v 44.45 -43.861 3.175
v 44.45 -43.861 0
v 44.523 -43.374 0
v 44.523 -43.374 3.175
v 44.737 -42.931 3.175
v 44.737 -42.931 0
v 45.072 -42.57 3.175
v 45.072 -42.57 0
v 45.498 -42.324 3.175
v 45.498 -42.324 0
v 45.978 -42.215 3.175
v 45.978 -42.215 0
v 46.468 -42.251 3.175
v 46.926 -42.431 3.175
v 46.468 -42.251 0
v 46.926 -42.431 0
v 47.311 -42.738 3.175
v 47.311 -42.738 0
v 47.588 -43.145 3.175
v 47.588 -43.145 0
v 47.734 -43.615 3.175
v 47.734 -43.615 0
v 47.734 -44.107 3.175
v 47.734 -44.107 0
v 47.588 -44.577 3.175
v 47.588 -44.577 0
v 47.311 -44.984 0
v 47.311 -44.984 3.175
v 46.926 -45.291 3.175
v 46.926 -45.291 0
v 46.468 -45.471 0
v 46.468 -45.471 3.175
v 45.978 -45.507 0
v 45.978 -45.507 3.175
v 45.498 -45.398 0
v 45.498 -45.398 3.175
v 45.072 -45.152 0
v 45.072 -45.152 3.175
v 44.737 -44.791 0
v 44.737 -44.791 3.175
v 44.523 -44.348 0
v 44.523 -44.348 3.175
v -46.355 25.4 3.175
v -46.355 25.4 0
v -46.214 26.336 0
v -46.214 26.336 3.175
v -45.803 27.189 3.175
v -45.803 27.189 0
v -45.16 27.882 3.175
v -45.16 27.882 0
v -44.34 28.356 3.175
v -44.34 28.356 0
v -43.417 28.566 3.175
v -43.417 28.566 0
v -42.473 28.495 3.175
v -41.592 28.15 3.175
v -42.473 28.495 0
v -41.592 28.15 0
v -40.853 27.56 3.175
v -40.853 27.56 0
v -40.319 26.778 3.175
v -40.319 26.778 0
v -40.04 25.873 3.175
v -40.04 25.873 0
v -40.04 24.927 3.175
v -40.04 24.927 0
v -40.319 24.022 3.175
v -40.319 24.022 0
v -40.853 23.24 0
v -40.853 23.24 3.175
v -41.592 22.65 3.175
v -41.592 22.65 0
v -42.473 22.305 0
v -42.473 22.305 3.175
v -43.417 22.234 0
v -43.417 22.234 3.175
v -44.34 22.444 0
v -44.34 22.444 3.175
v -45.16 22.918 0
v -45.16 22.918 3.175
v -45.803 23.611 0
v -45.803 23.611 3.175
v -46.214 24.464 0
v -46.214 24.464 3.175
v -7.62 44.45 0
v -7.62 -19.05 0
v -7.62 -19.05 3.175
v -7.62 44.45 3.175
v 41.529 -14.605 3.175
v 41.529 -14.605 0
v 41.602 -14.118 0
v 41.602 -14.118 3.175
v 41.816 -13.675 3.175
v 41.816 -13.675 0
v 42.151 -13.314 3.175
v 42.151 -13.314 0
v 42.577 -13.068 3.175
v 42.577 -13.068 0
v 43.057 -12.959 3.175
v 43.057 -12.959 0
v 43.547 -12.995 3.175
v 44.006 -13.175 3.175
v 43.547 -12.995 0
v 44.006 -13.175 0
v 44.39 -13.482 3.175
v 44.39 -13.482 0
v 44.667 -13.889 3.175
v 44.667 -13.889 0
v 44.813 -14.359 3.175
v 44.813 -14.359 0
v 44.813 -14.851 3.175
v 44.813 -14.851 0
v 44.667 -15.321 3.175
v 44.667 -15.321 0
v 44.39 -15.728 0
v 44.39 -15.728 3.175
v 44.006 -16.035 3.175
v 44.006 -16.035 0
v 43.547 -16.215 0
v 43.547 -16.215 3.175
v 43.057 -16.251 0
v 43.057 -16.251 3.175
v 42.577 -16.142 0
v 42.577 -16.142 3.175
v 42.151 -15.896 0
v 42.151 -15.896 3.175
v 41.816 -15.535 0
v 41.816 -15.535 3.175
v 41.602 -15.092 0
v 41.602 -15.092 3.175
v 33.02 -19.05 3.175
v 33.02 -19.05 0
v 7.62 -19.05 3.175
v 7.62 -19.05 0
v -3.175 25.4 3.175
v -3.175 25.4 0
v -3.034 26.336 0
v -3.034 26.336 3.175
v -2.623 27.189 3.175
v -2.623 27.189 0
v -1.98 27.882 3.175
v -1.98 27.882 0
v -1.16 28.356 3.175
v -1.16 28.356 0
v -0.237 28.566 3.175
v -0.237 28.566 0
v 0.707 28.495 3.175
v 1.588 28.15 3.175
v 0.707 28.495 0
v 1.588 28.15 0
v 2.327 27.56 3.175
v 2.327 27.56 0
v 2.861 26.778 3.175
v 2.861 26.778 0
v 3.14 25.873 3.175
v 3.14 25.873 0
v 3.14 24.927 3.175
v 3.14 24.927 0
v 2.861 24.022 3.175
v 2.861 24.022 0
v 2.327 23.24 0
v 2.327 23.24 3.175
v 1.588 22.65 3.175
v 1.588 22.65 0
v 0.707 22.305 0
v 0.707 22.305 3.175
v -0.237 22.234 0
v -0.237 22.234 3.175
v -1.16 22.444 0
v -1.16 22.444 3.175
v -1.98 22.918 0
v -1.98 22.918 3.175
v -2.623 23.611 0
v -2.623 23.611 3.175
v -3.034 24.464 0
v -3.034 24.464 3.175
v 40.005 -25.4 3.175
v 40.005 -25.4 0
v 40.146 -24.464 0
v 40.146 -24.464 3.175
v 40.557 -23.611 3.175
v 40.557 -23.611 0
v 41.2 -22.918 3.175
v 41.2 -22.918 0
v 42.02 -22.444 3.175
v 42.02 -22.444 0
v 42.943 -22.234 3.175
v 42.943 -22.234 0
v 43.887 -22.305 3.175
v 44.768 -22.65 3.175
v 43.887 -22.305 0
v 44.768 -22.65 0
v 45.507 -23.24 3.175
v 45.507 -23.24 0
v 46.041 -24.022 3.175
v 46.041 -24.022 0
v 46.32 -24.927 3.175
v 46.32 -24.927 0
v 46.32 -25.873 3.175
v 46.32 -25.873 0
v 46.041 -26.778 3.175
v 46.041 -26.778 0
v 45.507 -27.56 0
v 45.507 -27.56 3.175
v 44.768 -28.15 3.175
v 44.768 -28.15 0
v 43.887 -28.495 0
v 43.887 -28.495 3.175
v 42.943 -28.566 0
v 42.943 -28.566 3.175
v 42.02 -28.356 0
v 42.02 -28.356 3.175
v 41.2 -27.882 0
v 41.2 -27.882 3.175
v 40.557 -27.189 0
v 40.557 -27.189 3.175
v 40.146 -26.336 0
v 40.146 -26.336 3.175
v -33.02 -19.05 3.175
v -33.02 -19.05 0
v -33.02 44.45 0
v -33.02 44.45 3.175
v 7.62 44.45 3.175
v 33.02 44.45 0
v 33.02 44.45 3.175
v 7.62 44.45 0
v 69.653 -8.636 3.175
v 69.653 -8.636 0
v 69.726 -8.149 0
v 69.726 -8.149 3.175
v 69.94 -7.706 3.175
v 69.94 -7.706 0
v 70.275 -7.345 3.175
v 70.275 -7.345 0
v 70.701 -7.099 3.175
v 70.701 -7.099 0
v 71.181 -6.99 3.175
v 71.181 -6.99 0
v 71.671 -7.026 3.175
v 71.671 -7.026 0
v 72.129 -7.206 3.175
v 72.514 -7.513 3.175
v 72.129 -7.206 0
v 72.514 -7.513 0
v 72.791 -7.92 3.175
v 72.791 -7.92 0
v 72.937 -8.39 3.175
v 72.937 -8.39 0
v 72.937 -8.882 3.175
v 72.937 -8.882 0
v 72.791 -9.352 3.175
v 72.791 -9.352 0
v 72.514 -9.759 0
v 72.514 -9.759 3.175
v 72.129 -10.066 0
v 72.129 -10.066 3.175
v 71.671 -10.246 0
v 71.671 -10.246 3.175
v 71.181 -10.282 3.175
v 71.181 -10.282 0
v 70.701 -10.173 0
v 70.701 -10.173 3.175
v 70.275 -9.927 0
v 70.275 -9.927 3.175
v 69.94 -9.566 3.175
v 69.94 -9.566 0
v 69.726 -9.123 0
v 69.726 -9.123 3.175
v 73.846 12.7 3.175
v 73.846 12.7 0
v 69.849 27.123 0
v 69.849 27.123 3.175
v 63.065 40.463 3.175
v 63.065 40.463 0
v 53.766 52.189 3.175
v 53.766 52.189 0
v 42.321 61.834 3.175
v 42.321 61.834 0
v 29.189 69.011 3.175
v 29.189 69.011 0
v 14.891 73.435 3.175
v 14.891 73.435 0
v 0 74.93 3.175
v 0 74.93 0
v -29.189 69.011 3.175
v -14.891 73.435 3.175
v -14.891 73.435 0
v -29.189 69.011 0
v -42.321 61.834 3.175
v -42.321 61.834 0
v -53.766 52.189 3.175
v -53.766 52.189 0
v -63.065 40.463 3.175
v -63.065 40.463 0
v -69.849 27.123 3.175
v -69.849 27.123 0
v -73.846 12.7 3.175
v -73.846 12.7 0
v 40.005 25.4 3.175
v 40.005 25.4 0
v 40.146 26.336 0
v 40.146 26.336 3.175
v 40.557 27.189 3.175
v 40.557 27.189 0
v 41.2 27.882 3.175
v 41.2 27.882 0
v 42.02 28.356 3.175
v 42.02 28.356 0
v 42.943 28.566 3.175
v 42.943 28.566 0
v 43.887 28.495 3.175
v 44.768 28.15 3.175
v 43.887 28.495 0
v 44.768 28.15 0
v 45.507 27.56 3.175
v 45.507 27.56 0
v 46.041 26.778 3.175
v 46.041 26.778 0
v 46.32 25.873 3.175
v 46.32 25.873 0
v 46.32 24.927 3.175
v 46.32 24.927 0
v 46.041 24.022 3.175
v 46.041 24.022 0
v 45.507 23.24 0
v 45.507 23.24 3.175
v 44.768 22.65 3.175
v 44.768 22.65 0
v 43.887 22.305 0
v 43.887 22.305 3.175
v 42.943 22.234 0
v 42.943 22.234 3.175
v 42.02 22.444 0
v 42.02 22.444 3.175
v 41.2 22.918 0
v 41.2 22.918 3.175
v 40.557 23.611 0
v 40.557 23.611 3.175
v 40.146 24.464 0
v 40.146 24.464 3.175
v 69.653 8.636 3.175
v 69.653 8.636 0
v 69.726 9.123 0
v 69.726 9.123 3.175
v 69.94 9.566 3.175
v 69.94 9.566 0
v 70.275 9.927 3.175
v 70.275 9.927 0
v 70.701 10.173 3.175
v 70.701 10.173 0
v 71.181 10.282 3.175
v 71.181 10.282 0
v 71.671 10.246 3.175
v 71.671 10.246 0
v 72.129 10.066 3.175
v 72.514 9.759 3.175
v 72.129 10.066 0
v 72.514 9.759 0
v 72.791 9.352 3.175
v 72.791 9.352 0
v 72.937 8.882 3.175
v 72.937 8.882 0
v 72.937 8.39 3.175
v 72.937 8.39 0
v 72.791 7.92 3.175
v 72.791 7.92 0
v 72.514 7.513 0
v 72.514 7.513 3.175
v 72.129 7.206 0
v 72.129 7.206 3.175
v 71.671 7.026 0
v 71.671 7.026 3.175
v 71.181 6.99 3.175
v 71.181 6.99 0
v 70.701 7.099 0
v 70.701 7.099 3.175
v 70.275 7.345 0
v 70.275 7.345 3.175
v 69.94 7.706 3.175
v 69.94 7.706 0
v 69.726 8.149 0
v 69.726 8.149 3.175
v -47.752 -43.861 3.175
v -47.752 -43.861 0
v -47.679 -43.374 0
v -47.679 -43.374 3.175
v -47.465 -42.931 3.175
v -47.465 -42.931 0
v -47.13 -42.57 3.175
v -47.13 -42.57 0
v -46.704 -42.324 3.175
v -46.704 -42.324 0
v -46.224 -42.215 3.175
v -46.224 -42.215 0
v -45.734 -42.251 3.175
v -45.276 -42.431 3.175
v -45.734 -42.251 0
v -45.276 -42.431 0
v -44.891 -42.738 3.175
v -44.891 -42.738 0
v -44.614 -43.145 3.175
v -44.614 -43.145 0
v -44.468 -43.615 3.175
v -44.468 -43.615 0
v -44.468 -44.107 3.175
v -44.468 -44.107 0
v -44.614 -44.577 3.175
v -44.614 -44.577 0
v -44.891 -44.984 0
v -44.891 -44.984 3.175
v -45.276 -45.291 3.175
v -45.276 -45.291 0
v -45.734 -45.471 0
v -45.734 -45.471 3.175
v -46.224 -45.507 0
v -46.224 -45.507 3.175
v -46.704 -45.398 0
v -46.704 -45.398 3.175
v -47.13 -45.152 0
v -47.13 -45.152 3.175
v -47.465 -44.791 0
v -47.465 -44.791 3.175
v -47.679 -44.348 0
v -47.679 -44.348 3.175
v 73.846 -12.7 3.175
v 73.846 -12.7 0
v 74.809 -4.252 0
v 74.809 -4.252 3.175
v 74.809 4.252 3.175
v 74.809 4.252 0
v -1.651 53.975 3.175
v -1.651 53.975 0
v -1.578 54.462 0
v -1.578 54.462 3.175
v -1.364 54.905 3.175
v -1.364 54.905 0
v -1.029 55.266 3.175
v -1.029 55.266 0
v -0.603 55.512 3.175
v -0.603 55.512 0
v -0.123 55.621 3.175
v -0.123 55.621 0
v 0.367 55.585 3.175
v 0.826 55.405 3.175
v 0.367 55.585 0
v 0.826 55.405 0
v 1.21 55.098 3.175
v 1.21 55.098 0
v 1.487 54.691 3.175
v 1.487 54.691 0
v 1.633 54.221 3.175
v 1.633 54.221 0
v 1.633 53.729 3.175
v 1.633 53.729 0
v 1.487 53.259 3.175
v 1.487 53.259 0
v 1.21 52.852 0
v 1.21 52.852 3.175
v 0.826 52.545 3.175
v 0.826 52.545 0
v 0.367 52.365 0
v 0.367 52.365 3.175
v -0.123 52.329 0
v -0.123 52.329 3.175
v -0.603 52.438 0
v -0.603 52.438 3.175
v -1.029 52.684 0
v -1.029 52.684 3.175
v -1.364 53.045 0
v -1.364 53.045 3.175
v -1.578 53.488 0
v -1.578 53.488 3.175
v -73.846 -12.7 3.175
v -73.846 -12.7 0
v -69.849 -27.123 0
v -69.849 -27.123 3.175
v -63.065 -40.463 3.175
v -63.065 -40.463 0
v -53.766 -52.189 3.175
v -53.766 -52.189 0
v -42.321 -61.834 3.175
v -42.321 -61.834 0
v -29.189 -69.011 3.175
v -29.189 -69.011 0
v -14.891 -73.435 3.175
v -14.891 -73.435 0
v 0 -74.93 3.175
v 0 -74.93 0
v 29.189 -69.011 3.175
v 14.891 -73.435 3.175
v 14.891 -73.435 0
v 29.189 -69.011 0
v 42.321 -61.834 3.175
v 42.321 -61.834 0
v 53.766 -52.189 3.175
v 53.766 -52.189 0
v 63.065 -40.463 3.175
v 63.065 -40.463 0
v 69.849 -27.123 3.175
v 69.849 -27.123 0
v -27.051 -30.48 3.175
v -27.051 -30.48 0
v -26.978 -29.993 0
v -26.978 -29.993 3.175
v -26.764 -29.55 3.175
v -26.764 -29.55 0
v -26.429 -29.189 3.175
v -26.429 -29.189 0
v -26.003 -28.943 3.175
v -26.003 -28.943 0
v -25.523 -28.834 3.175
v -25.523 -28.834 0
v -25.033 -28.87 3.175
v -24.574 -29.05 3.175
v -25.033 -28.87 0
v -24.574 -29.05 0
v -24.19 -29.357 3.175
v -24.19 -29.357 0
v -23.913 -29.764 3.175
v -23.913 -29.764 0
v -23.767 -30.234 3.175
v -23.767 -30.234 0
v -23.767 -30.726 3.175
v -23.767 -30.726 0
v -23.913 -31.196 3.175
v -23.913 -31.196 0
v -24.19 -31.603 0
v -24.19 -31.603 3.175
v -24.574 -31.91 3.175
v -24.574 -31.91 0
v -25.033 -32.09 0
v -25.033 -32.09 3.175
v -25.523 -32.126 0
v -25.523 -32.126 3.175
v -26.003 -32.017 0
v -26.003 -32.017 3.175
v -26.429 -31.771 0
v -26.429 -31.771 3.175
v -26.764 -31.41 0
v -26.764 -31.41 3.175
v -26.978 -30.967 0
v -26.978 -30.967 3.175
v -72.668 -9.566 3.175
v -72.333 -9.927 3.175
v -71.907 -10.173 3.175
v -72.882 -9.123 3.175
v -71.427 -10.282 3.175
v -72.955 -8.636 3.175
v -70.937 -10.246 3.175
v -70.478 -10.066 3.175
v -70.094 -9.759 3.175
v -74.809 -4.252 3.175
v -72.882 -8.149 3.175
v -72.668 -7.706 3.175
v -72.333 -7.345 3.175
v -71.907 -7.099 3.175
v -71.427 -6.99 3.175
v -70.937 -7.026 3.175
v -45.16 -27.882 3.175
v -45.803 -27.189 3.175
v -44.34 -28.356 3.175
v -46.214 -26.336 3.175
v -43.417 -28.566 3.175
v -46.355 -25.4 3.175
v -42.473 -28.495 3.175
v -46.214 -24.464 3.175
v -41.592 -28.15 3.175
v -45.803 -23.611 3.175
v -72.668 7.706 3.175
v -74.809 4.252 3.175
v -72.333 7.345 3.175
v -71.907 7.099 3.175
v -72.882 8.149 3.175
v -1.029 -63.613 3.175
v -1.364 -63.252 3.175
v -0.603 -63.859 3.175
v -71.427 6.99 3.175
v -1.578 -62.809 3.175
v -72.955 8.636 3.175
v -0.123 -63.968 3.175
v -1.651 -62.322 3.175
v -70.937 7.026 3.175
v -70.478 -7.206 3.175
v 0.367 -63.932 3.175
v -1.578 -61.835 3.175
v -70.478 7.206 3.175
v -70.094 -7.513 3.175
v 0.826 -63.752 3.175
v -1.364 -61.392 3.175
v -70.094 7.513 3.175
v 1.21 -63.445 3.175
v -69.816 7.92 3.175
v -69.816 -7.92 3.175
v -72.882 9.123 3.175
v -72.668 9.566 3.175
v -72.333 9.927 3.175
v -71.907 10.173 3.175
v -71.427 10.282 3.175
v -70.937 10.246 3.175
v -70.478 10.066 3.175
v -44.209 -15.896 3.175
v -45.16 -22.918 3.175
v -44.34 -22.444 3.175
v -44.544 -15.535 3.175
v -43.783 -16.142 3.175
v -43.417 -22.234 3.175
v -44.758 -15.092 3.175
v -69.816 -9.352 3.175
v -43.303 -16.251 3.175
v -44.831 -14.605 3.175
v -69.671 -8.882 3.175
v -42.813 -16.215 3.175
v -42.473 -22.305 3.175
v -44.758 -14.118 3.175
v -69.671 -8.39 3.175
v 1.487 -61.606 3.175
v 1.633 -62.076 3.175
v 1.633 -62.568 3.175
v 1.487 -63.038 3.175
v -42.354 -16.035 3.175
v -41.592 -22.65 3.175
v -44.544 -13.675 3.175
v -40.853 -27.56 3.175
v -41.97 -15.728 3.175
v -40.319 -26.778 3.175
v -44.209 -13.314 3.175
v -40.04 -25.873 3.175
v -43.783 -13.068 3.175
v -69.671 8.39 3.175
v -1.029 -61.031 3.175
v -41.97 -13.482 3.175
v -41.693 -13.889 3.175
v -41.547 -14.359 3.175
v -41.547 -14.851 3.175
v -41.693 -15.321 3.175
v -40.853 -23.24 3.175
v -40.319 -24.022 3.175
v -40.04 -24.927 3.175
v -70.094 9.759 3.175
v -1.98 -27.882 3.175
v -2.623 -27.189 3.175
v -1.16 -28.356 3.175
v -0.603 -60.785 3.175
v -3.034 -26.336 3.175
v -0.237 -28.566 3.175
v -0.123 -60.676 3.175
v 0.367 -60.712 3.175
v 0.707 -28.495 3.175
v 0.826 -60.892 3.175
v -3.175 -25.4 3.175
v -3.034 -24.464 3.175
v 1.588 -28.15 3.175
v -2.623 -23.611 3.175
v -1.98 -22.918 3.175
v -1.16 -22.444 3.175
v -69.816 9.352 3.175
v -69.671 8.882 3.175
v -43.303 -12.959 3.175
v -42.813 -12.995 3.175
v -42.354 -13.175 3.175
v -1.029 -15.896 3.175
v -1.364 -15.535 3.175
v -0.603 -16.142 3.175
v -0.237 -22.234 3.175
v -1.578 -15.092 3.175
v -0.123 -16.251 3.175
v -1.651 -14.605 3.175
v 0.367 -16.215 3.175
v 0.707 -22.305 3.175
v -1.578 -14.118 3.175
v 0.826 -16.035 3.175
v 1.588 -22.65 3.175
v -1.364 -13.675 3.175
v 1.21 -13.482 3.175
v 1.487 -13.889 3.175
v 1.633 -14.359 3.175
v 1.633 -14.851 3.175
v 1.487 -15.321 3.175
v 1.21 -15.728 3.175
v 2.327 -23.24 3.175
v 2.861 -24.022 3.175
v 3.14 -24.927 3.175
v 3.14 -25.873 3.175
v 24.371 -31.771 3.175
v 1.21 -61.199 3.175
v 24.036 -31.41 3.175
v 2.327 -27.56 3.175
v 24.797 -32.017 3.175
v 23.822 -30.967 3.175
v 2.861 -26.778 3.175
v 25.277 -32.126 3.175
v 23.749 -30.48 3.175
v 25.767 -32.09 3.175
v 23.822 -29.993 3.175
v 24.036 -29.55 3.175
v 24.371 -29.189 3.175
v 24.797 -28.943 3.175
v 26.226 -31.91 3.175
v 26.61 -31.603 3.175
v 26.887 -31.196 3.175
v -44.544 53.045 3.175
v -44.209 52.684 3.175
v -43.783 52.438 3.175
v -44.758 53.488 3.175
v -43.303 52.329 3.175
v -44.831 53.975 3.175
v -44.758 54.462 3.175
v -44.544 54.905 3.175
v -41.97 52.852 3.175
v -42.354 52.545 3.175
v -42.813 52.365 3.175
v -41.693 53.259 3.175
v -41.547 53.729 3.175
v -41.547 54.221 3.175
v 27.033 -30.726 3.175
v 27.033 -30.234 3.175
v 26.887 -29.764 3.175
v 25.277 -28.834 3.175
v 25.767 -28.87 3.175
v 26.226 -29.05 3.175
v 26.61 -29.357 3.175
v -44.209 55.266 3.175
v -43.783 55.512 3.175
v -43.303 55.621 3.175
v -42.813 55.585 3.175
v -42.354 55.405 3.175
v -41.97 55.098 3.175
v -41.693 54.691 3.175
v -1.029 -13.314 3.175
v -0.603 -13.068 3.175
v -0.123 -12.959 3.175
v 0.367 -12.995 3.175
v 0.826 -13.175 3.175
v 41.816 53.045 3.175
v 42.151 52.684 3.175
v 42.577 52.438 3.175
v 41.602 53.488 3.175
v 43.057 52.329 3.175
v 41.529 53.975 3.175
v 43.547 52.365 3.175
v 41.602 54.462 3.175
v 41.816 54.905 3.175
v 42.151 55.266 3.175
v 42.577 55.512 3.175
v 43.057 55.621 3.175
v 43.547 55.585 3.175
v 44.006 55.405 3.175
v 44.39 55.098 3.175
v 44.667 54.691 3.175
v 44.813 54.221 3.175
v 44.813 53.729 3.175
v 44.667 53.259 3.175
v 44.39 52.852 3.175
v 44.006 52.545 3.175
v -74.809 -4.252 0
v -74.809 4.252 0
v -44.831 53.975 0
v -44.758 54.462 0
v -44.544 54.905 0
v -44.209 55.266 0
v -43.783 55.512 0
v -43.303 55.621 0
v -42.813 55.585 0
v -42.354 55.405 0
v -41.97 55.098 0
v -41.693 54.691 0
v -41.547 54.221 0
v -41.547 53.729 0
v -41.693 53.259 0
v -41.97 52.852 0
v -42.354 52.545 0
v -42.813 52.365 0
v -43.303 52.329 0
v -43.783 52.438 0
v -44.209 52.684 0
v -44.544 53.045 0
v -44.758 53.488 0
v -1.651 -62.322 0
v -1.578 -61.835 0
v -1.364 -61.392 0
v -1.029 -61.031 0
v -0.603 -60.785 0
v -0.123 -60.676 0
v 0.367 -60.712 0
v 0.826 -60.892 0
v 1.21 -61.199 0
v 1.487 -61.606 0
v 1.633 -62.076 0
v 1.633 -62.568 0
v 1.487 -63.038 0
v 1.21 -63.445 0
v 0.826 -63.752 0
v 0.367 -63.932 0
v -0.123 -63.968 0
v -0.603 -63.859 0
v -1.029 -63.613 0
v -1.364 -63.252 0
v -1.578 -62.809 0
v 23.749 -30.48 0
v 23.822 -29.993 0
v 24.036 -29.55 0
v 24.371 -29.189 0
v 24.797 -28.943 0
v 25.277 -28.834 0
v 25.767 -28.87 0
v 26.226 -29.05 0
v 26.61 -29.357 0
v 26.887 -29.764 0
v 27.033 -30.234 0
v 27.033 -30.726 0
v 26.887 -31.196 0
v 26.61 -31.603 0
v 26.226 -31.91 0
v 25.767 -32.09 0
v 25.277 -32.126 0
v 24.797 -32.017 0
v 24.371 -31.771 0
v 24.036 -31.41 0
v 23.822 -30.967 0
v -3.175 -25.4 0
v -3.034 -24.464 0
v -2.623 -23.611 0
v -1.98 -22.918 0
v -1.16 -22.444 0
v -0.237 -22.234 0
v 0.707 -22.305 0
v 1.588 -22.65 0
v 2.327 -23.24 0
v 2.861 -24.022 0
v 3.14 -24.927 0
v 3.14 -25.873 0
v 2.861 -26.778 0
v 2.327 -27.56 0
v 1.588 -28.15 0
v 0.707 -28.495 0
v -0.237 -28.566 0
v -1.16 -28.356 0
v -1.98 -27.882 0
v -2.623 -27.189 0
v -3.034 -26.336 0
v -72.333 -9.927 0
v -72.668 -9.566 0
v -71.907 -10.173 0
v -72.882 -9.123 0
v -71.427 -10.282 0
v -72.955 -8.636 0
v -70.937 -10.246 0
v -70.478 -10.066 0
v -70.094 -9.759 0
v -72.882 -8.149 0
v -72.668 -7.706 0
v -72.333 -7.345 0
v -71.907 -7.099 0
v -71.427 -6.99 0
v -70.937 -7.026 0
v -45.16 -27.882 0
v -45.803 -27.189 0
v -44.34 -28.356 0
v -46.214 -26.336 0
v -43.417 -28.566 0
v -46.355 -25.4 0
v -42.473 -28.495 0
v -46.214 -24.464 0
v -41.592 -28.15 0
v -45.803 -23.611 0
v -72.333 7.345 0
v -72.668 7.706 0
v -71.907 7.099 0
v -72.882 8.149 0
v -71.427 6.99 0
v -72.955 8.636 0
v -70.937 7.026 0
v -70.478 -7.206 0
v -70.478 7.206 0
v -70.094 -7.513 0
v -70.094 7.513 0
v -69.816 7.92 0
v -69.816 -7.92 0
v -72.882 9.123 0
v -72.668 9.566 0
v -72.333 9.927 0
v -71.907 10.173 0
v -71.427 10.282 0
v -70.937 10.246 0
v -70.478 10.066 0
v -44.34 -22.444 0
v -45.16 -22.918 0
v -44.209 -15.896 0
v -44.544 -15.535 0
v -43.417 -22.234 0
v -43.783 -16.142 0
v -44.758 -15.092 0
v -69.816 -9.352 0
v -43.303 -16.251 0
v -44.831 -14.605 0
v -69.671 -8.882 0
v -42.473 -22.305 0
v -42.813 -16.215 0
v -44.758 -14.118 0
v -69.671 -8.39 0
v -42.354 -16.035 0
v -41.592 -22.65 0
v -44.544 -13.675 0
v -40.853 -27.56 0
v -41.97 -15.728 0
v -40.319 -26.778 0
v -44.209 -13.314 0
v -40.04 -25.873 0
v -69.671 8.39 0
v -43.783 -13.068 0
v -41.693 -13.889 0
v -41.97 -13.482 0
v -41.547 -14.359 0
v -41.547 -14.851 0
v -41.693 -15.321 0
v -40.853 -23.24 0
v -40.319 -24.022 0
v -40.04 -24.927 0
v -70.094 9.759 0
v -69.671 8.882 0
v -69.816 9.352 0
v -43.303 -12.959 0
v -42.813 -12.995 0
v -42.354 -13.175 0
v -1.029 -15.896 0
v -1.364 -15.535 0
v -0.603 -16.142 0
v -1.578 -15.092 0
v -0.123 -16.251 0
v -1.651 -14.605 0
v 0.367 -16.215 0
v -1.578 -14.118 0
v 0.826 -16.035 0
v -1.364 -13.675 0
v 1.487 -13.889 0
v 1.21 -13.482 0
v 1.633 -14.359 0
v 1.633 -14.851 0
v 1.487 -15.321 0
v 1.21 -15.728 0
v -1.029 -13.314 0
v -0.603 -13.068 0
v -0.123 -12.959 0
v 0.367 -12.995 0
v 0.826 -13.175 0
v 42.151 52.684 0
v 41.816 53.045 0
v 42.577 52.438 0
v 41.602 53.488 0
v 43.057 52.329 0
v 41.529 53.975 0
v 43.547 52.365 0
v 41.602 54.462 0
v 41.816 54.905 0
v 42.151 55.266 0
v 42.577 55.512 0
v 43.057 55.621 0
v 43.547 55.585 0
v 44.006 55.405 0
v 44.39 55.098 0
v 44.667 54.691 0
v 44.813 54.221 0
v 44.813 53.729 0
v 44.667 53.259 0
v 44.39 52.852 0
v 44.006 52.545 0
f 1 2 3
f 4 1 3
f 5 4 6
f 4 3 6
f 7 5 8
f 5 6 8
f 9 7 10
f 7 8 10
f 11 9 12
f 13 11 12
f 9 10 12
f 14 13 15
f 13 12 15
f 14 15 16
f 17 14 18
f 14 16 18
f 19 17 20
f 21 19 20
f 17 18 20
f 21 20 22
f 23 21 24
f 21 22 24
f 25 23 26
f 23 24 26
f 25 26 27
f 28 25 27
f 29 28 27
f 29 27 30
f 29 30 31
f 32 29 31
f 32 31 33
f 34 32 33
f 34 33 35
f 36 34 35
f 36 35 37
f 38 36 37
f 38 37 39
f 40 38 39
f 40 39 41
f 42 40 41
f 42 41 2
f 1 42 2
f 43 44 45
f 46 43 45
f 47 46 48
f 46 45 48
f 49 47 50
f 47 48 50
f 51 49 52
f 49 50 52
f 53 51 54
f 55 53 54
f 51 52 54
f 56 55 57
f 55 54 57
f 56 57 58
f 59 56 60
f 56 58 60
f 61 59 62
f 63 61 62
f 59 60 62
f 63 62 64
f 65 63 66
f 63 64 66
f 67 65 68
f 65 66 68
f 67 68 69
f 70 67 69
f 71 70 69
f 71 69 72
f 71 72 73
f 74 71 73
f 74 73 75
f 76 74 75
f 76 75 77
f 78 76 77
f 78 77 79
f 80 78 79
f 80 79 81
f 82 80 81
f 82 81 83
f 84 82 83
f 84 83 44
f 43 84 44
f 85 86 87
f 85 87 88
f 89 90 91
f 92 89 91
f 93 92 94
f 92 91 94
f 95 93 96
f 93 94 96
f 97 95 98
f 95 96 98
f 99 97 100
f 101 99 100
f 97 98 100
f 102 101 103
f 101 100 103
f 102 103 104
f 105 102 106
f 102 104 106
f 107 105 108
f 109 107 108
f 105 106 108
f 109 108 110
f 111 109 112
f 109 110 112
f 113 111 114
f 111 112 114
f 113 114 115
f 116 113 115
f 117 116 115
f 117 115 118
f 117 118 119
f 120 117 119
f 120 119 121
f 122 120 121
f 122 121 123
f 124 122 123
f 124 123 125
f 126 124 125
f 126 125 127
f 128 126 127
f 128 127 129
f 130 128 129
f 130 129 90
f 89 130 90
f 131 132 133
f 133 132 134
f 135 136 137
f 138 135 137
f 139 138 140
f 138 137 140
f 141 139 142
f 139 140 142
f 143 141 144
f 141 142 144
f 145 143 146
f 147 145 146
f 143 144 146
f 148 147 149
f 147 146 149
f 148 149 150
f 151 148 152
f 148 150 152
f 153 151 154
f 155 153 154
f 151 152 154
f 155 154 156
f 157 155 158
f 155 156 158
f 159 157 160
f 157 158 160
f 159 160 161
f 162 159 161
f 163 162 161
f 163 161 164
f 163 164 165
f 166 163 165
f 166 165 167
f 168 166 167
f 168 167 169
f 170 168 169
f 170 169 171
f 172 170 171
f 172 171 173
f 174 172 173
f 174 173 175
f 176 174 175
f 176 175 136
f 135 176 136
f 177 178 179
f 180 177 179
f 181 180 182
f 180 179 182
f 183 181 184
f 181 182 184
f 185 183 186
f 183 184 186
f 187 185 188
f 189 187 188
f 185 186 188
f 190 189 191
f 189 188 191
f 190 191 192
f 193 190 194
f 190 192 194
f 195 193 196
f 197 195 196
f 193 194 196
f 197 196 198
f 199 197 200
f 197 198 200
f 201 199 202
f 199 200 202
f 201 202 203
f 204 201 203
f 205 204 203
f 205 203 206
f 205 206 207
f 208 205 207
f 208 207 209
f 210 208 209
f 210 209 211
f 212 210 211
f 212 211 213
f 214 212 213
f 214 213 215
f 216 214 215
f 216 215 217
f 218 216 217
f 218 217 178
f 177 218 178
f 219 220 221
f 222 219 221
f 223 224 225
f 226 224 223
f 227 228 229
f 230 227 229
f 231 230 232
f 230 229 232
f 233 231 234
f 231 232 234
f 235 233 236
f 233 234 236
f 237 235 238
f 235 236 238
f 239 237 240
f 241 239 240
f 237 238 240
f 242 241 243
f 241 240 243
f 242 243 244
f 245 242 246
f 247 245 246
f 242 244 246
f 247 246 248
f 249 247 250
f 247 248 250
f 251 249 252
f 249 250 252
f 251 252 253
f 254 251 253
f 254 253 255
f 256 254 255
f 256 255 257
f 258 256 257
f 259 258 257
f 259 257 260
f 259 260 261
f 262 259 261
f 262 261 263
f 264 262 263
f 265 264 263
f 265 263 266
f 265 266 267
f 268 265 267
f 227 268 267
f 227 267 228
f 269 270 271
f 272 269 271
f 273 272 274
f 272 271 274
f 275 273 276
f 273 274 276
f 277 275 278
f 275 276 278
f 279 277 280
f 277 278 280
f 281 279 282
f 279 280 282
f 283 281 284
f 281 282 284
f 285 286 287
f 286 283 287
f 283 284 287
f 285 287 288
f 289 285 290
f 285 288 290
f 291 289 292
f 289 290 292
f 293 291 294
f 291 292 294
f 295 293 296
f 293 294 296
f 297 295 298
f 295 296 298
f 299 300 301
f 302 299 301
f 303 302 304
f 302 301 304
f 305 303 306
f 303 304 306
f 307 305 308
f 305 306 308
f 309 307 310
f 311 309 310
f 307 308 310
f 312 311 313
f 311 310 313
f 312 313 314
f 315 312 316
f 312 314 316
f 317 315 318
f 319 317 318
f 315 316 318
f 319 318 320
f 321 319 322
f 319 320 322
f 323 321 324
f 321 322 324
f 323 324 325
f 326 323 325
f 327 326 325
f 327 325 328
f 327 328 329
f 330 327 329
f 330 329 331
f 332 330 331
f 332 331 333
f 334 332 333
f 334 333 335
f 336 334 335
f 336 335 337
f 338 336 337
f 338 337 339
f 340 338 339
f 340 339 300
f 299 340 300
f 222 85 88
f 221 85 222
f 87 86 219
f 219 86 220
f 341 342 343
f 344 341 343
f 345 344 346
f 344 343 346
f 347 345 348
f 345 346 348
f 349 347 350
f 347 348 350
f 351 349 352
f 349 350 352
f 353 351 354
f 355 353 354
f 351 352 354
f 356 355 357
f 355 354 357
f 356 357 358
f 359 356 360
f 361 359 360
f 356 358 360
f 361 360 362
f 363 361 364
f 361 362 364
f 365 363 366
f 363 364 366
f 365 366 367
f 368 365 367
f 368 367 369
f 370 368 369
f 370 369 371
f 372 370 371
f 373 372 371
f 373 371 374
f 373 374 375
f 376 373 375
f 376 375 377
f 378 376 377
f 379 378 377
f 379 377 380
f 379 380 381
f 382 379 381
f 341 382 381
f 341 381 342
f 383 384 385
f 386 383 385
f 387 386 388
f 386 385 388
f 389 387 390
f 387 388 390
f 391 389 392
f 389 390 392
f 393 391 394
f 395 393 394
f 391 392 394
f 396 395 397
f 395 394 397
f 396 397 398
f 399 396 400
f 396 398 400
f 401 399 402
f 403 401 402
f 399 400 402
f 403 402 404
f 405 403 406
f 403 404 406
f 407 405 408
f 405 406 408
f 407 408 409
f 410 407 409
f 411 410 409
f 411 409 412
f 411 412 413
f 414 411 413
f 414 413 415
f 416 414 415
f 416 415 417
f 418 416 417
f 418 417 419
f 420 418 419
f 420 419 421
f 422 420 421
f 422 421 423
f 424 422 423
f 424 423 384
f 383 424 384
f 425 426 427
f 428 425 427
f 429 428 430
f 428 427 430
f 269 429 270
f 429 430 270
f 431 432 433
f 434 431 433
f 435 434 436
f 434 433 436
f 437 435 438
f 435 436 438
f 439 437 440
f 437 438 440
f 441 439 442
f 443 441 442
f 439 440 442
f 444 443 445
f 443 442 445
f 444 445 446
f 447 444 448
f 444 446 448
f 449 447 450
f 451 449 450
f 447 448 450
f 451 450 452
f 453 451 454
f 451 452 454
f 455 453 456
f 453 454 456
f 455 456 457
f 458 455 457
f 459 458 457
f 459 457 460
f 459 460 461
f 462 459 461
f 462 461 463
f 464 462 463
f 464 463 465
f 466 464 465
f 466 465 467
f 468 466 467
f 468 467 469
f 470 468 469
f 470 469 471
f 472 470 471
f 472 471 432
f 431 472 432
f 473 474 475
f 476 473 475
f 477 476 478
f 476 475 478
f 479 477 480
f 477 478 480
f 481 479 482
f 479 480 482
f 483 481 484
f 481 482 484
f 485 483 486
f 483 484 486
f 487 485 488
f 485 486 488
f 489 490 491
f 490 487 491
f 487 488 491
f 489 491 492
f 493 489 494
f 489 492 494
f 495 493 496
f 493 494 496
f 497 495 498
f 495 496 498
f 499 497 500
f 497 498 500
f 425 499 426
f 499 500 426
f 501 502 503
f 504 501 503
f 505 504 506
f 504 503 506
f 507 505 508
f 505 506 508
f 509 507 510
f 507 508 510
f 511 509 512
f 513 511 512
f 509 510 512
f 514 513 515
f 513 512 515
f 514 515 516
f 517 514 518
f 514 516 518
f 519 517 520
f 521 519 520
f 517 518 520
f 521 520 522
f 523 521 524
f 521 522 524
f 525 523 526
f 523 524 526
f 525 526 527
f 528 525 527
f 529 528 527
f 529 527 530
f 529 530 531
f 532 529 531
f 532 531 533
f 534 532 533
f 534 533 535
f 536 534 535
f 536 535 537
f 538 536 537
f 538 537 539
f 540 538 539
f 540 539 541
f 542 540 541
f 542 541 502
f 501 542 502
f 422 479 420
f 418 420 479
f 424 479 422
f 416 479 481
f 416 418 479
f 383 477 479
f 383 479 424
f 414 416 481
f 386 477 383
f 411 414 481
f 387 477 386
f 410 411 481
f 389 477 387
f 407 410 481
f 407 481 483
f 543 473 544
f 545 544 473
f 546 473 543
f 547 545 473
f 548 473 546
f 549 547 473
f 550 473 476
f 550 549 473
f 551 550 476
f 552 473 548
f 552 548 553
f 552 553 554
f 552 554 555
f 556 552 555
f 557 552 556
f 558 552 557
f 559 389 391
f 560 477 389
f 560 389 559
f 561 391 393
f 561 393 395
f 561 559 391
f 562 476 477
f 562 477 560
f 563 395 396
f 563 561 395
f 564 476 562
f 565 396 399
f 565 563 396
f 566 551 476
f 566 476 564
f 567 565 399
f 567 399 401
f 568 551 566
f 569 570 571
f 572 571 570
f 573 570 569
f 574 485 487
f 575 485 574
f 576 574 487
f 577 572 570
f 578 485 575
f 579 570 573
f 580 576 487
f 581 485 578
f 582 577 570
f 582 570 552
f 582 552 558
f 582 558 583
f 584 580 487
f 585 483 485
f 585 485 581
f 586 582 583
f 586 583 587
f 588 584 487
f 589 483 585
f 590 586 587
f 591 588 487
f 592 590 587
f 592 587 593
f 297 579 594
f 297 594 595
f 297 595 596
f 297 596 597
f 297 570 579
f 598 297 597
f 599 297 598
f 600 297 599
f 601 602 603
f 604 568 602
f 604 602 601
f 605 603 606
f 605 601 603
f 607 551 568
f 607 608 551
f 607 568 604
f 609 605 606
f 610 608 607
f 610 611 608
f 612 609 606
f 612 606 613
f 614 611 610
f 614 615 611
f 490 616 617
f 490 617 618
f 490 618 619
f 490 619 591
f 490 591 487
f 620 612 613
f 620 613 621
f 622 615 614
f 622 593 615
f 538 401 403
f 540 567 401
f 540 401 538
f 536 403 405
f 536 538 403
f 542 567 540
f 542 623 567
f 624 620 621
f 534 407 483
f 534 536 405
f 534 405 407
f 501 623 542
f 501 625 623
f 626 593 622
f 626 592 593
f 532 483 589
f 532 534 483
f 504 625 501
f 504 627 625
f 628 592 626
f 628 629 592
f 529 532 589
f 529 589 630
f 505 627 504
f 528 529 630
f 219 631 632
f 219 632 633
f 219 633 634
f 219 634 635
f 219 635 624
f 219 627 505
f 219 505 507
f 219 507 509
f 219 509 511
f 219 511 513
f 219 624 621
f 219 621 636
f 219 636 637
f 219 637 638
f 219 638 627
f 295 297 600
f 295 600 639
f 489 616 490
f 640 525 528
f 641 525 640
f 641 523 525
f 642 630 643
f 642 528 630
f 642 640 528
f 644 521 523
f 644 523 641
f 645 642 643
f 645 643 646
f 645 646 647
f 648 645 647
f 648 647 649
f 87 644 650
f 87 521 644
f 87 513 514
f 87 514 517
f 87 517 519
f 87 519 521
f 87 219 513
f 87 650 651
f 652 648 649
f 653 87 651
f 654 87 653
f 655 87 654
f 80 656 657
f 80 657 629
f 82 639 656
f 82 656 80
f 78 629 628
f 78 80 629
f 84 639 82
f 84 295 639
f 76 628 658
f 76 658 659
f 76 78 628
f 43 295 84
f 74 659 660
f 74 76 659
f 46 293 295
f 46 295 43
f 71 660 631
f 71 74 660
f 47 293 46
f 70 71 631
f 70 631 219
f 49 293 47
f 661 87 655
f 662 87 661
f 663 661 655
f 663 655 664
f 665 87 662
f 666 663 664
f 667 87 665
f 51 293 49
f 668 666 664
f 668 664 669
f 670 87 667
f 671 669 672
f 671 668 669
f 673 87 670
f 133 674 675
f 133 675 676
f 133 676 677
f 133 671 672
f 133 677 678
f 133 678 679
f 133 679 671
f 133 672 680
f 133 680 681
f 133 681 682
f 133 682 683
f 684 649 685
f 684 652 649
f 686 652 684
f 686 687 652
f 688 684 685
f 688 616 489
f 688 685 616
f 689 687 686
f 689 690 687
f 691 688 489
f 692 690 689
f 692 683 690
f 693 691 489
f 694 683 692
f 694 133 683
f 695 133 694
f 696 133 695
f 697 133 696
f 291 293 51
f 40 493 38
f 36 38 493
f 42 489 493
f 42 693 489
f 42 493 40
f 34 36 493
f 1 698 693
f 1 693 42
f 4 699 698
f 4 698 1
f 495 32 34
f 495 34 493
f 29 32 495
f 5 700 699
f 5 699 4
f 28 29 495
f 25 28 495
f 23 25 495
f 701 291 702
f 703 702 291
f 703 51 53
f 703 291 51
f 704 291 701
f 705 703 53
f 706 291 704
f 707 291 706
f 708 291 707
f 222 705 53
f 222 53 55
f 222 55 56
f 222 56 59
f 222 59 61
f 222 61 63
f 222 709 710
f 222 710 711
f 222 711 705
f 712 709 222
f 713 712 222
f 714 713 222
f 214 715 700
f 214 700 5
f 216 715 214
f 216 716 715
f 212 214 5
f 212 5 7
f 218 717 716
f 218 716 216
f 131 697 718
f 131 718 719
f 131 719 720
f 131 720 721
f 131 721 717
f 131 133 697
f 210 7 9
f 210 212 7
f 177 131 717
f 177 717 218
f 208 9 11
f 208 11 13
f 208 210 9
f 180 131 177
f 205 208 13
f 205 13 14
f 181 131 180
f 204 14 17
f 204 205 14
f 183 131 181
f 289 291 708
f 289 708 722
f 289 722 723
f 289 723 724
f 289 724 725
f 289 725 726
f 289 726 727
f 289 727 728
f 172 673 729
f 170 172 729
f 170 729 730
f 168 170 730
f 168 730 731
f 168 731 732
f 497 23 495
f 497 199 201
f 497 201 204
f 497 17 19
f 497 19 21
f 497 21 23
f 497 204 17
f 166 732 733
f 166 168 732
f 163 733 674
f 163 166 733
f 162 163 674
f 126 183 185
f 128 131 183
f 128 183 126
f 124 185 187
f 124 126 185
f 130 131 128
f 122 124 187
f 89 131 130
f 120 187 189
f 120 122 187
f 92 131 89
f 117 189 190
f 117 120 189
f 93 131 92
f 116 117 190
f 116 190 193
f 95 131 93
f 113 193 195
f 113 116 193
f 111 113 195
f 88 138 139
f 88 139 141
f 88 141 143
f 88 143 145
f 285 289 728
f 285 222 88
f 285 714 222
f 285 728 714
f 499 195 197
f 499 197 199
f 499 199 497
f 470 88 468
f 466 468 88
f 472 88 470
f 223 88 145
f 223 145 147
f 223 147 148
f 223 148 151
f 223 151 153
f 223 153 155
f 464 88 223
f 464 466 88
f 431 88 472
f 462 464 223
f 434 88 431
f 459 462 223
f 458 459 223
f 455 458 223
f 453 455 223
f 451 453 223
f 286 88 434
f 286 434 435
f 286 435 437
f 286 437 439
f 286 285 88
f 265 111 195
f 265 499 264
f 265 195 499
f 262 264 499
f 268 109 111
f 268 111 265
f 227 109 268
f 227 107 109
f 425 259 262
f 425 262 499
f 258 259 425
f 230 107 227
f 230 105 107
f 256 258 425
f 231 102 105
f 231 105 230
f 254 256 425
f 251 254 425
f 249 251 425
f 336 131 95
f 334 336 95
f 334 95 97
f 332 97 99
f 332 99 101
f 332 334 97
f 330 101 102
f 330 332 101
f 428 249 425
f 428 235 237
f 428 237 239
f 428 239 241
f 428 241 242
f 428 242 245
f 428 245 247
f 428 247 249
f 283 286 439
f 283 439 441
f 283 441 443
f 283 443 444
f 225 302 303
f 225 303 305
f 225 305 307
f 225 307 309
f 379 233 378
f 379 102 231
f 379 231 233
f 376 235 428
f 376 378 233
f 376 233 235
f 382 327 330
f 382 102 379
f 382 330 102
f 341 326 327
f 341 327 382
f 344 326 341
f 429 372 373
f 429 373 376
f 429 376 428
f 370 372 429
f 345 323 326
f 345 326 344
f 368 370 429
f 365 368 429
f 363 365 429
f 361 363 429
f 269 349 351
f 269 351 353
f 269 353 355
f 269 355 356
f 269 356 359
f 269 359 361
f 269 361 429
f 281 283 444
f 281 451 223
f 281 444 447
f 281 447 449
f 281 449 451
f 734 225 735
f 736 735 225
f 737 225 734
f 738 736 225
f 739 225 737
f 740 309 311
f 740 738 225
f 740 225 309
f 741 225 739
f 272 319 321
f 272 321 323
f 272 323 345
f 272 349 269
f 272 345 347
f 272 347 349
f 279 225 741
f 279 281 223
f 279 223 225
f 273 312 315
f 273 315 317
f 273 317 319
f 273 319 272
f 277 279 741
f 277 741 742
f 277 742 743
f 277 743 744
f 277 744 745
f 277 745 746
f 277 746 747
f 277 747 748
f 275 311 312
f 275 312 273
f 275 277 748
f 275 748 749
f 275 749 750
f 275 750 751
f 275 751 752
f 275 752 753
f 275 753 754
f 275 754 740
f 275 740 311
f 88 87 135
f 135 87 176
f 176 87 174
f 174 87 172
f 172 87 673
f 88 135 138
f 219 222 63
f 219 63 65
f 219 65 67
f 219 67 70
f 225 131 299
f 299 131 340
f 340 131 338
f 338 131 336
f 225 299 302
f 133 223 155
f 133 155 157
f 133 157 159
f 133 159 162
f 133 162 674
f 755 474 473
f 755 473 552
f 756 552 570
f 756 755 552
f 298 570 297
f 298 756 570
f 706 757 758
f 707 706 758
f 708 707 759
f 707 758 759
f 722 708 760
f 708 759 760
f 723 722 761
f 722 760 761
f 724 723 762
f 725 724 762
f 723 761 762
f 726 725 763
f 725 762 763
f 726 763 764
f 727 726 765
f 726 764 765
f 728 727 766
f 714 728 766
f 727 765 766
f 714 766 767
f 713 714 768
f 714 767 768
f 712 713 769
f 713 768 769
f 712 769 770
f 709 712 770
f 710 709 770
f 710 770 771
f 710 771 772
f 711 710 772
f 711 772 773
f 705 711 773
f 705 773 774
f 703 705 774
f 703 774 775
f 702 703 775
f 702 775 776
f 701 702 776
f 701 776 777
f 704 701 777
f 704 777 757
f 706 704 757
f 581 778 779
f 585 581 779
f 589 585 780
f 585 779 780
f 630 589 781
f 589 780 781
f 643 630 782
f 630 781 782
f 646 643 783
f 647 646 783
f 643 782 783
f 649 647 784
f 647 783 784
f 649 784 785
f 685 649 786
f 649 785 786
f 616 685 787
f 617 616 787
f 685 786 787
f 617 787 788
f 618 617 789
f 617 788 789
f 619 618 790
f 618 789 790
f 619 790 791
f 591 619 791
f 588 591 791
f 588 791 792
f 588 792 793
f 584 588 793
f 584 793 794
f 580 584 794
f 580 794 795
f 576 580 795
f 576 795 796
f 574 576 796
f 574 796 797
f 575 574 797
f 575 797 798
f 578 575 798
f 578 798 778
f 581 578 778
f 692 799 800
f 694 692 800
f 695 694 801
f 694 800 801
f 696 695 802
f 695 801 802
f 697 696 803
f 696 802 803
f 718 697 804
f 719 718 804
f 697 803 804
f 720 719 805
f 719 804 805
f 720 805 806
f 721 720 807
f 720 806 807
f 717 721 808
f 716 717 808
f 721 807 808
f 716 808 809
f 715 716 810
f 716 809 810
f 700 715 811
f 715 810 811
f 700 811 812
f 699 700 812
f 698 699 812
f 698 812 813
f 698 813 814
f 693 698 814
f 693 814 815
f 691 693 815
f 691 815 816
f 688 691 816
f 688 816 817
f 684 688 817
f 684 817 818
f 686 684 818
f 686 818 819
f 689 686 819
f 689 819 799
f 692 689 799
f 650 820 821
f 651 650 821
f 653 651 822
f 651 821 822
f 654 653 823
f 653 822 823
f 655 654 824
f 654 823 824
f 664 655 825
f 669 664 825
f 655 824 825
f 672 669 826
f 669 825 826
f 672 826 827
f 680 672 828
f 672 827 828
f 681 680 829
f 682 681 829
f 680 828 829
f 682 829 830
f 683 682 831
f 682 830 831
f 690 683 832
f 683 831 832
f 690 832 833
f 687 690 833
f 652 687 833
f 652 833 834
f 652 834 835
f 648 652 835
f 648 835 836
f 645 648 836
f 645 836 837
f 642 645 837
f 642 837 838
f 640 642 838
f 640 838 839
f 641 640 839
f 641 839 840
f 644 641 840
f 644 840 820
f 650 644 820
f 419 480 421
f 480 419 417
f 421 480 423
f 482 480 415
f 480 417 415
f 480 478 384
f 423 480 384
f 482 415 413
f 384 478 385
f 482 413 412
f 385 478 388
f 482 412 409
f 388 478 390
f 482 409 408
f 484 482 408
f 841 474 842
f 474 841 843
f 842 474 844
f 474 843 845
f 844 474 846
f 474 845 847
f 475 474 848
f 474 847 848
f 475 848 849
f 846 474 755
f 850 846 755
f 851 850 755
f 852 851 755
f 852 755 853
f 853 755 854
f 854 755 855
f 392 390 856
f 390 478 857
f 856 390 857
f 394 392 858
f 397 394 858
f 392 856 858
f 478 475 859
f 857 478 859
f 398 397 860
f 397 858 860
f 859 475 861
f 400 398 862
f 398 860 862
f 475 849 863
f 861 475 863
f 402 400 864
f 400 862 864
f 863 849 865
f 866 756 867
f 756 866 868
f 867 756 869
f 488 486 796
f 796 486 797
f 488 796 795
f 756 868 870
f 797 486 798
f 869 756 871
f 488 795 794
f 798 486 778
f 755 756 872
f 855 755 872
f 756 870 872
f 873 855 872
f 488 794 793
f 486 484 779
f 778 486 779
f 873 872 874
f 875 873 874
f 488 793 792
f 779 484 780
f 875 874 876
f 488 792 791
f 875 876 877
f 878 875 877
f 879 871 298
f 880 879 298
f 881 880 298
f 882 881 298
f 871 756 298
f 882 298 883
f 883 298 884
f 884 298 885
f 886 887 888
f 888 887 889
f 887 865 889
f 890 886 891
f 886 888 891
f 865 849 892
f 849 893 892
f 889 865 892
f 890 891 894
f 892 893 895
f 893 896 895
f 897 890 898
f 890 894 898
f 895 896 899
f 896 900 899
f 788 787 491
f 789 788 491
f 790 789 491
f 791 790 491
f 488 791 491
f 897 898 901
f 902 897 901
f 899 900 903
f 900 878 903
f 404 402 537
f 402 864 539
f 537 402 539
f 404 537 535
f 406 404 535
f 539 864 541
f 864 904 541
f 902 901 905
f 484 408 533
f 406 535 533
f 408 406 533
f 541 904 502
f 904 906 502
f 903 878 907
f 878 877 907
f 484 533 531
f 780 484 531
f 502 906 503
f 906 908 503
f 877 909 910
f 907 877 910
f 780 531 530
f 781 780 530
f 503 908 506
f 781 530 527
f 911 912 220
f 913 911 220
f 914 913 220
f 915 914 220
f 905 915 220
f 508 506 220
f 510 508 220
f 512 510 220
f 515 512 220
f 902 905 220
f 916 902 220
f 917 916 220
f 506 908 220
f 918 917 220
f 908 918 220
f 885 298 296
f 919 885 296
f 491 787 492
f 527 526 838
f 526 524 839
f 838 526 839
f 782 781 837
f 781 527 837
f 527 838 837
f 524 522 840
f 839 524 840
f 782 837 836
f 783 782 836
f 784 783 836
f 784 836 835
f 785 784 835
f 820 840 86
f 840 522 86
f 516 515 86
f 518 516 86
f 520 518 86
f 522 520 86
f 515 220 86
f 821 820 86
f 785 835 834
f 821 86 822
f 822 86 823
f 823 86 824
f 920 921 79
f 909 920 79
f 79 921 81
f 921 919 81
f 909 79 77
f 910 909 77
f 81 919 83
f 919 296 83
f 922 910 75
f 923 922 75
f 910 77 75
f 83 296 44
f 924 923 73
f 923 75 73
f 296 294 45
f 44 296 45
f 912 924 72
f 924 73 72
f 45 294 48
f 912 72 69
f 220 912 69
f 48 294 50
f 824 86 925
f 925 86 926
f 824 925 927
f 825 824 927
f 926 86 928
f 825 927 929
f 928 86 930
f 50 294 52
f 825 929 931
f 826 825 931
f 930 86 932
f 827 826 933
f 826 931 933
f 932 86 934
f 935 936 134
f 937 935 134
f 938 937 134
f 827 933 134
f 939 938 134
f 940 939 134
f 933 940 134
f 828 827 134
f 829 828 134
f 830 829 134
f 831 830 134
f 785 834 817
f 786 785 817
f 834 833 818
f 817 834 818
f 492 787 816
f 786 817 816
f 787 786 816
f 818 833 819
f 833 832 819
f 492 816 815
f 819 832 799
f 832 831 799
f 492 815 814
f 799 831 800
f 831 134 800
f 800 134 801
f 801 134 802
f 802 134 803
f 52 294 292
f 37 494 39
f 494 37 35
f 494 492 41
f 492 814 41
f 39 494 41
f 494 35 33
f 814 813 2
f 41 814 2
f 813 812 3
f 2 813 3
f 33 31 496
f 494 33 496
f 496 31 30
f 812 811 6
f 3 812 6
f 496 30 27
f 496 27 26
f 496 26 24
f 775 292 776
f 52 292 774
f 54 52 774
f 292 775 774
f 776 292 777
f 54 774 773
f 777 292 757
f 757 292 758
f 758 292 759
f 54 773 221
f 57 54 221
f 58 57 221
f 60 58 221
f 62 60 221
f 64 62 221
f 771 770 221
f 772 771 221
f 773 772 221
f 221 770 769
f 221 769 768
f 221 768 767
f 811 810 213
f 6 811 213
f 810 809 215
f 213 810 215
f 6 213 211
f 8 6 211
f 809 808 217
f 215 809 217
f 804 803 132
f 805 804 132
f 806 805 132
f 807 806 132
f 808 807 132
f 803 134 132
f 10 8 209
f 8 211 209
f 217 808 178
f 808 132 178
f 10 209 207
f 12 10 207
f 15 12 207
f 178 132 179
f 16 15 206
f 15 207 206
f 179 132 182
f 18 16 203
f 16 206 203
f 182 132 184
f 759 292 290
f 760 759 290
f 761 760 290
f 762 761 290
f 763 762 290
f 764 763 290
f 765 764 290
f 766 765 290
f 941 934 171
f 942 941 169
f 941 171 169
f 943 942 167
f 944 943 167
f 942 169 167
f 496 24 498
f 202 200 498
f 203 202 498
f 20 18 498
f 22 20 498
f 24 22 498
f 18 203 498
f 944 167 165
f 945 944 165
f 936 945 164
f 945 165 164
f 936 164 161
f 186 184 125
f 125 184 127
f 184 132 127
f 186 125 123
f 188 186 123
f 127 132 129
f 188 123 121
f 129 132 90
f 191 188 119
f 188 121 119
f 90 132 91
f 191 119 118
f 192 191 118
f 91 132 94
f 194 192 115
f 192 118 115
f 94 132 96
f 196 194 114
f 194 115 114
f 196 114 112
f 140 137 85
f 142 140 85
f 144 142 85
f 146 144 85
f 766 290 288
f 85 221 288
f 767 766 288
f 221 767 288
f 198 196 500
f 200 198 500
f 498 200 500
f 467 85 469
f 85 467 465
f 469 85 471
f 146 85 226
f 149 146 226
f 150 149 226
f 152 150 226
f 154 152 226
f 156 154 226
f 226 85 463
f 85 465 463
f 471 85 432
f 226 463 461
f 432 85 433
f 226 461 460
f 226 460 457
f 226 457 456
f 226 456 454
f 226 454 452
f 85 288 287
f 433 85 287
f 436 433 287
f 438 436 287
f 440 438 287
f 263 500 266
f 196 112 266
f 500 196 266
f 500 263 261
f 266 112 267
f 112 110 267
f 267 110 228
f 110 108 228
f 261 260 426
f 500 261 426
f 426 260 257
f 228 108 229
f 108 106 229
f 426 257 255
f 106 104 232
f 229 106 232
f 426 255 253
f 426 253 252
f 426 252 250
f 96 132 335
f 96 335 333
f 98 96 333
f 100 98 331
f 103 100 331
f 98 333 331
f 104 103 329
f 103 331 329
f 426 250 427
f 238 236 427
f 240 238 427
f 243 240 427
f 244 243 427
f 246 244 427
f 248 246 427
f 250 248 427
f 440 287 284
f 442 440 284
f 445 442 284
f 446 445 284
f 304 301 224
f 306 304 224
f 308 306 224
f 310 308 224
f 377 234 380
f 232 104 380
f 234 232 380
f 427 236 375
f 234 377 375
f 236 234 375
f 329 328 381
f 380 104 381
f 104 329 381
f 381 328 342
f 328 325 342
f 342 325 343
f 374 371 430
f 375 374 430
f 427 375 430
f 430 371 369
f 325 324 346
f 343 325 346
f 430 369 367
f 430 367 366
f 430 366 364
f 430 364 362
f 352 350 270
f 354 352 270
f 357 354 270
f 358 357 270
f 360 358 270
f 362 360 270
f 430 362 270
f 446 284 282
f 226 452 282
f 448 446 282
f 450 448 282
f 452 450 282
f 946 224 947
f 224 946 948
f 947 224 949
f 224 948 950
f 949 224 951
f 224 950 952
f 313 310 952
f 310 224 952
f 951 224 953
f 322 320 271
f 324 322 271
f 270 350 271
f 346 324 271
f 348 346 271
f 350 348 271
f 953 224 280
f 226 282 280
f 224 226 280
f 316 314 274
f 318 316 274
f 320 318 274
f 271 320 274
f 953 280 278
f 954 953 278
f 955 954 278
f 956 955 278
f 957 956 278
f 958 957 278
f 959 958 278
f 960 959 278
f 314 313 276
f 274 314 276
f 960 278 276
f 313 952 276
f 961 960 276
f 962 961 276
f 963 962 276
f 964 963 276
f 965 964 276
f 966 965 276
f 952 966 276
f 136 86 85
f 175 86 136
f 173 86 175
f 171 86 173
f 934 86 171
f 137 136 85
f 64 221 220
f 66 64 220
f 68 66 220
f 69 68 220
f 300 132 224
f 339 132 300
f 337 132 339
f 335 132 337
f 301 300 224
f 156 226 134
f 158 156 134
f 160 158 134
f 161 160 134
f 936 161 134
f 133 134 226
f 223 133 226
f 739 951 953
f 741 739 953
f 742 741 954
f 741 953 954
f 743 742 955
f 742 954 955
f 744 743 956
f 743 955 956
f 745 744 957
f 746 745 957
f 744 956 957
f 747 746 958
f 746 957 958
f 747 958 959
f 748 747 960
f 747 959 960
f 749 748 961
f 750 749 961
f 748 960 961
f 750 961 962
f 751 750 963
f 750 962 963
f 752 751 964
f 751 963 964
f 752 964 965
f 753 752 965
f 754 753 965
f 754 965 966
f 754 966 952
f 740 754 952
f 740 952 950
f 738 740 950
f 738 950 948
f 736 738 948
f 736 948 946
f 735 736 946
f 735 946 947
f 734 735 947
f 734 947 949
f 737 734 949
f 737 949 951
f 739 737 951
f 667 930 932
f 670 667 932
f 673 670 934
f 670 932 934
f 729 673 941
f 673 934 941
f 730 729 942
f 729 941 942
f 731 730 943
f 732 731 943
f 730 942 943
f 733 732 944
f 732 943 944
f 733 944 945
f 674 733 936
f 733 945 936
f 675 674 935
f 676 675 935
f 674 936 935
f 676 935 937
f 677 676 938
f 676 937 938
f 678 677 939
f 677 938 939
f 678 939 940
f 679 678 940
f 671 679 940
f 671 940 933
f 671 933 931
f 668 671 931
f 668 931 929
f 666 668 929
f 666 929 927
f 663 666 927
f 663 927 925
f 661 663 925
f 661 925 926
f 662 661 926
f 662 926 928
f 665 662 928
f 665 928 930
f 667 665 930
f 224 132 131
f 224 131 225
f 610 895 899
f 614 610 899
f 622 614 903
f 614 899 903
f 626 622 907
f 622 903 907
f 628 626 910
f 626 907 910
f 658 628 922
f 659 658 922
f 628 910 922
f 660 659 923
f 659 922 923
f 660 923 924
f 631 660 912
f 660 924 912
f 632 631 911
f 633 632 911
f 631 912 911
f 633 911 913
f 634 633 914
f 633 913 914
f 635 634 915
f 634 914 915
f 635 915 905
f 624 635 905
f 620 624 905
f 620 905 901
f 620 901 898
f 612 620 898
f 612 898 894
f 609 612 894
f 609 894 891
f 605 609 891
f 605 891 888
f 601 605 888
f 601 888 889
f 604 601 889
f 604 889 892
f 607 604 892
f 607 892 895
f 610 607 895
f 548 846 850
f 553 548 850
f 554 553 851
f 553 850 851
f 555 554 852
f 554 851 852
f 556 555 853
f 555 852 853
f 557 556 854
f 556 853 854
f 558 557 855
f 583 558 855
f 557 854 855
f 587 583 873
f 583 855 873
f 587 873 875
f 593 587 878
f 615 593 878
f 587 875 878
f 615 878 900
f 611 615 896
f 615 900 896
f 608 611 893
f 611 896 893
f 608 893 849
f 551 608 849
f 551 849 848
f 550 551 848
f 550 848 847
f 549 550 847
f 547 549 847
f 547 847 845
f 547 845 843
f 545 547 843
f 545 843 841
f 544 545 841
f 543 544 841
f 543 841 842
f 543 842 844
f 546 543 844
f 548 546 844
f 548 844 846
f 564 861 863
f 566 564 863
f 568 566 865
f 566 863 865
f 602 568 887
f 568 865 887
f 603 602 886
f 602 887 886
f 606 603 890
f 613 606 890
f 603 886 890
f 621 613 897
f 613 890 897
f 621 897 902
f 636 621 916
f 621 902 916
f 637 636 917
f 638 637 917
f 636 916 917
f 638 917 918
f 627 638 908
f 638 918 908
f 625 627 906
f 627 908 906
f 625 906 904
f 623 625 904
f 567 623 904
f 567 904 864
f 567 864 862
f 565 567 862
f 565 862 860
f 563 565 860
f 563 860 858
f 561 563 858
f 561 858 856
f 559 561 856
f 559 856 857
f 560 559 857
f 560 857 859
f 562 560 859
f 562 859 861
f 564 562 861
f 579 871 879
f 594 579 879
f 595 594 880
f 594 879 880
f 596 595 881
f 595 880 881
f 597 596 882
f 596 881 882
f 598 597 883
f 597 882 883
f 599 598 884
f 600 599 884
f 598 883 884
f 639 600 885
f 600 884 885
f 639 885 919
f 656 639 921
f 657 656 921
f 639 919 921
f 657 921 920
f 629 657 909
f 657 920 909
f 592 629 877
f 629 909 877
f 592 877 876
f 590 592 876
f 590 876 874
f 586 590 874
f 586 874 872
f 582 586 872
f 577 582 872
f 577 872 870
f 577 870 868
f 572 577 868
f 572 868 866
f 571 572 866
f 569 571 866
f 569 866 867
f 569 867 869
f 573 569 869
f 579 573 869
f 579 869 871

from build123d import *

# Parameters (mm, degrees)
SKETCH1_R           = 1.651
BOSS_EXTRUDE2_DEPTH = 3.175
SKETCH5_W           = 36.105919561
SKETCH5_H           = 30.801250688
SKETCH5_W_2         = 35.958513686
SKETCH5_H_2         = 33.469345806
BOSS_EXTRUDE4_DEPTH = 3.175
SKETCH11_R          = 1.651
CUT_EXTRUDE7_DEPTH  = 4.175
BOSS_EXTRUDE6_DEPTH = 3.175
SKETCH13_R          = 3.175
CUT_EXTRUDE8_DEPTH  = 21.59
SKETCH14_W          = 25.4
SKETCH14_H          = 63.5
CUT_EXTRUDE9_DEPTH  = 46.482
SKETCH15_R          = 1.651
CUT_EXTRUDE10_DEPTH = 150.876


with BuildPart() as part:
    # Sketch1 → Boss-Extrude2 (new body)
    with BuildSketch(Plane.XY):
        with BuildLine():
            Line((-73.845886141, 12.7), (-56.065886141, 12.7))
            Line((-56.065886141, 12.7), (-56.065886141, -12.7))
            Line((-56.065886141, -12.7), (-73.845886141, -12.7))
            ThreePointArc((-73.845886141, -12.7), (0, -74.93), (73.845886141, -12.7))
            Line((73.845886141, -12.7), (56.065886141, -12.7))
            Line((56.065886141, -12.7), (56.065886141, 12.7))
            Line((56.065886141, 12.7), (73.845886141, 12.7))
            ThreePointArc((73.845886141, 12.7), (0, 74.93), (-73.845886141, 12.7))
        make_face()
        with Locations((-45.466, 11.049)):
            Circle(SKETCH1_R, mode=Mode.SUBTRACT)
        with Locations((-20.067270032, 10.795)):
            Circle(SKETCH1_R, mode=Mode.SUBTRACT)
        with Locations((-20.067270032, -10.795)):
            Circle(SKETCH1_R, mode=Mode.SUBTRACT)
        with Locations((-45.466, -11.049)):
            Circle(SKETCH1_R, mode=Mode.SUBTRACT)
        with Locations((45.466, -11.049)):
            Circle(SKETCH1_R, mode=Mode.SUBTRACT)
        with Locations((20.067270032, -10.795)):
            Circle(SKETCH1_R, mode=Mode.SUBTRACT)
        with Locations((20.067270032, 10.795)):
            Circle(SKETCH1_R, mode=Mode.SUBTRACT)
        with Locations((45.466, 11.049)):
            Circle(SKETCH1_R, mode=Mode.SUBTRACT)
    extrude(amount=BOSS_EXTRUDE2_DEPTH)

    # Sketch5 → Boss-Extrude4 (add)
    with BuildSketch(Plane(origin=(0, 0, 0), x_dir=(-1, 0, 0), z_dir=(0, 0, -1))):
        with Locations((34.78484389, -0.38515144)):
            Rectangle(SKETCH5_W, SKETCH5_H)
        with Locations((-32.830563904, 0.948896119)):
            Rectangle(SKETCH5_W_2, SKETCH5_H_2)
    extrude(amount=-BOSS_EXTRUDE4_DEPTH)

    # Sketch11 → Cut-Extrude7 (cut, through all)
    with BuildSketch(Plane(origin=(0, 0, 0), x_dir=(-1, 0, 0), z_dir=(0, 0, -1))):
        with Locations((43.18, 53.975)):
            Circle(SKETCH11_R)
        with Locations((0, 53.975)):
            Circle(SKETCH11_R)
        with Locations((0, -14.605)):
            Circle(SKETCH11_R)
        with Locations((43.18, -14.605)):
            Circle(SKETCH11_R)
        with Locations((-43.18, 53.975)):
            Circle(SKETCH11_R)
        with Locations((-43.18, -14.605)):
            Circle(SKETCH11_R)
        with Locations((-25.4, -30.48)):
            Circle(SKETCH11_R)
        with Locations((-46.101, -43.8609994)):
            Circle(SKETCH11_R)
        with Locations((46.101, -43.8609994)):
            Circle(SKETCH11_R)
        with Locations((0, -62.3219988)):
            Circle(SKETCH11_R)
        with Locations((25.4, -30.48)):
            Circle(SKETCH11_R)
    extrude(amount=-CUT_EXTRUDE7_DEPTH, mode=Mode.SUBTRACT)

    # Sketch12 → Boss-Extrude6 (add)
    with BuildSketch(Plane(origin=(0, 0, 0), x_dir=(-1, 0, 0), z_dir=(0, 0, -1))):
        with BuildLine():
            Line((-54.995250635, 50.892310889), (-54.566459663, -51.351790425))
            ThreePointArc((-54.566459663, -51.351790425), (-74.929341077, -0.314238422), (-54.995250635, 50.892310889))
        make_face()
        with BuildLine():
            Line((54.995250635, 50.892310889), (54.995250635, -50.892310889))
            ThreePointArc((54.995250635, -50.892310889), (74.93, 0), (54.995250635, 50.892310889))
        make_face()
    extrude(amount=-BOSS_EXTRUDE6_DEPTH)

    # Sketch13 → Cut-Extrude8 (cut)
    with BuildSketch(Plane(origin=(0, 0, 0), x_dir=(-1, 0, 0), z_dir=(0, 0, -1))):
        with Locations((0, 25.4)):
            Circle(SKETCH13_R)
        with Locations((43.18, 25.4)):
            Circle(SKETCH13_R)
        with Locations((-43.18, 25.4)):
            Circle(SKETCH13_R)
        with Locations((-43.18, -25.4)):
            Circle(SKETCH13_R)
        with Locations((0, -25.4)):
            Circle(SKETCH13_R)
        with Locations((43.18, -25.4)):
            Circle(SKETCH13_R)
    extrude(amount=-CUT_EXTRUDE8_DEPTH, mode=Mode.SUBTRACT)

    # Sketch14 → Cut-Extrude9 (cut)
    with BuildSketch(Plane(origin=(0, 0, 0), x_dir=(-1, 0, 0), z_dir=(0, 0, -1))):
        with Locations((-20.32, 12.7)):
            Rectangle(SKETCH14_W, SKETCH14_H)
        with Locations((20.32, 12.7)):
            Rectangle(SKETCH14_W, SKETCH14_H)
    extrude(amount=-CUT_EXTRUDE9_DEPTH, mode=Mode.SUBTRACT)

    # Sketch15 → Cut-Extrude10 (cut)
    with BuildSketch(Plane(origin=(-30.092005081, 4.08352975, -73.025), x_dir=(-1, 0, 0), z_dir=(0, 0, -1))):
        with Locations((-101.395980802, -12.71952975)):
            Circle(SKETCH15_R)
        with Locations((-101.395980802, 4.55247025)):
            Circle(SKETCH15_R)
        with Locations((41.211970641, -12.71952975)):
            Circle(SKETCH15_R)
        with Locations((41.211970641, 4.55247025)):
            Circle(SKETCH15_R)
    extrude(amount=-CUT_EXTRUDE10_DEPTH, mode=Mode.SUBTRACT)


solid = part.part
